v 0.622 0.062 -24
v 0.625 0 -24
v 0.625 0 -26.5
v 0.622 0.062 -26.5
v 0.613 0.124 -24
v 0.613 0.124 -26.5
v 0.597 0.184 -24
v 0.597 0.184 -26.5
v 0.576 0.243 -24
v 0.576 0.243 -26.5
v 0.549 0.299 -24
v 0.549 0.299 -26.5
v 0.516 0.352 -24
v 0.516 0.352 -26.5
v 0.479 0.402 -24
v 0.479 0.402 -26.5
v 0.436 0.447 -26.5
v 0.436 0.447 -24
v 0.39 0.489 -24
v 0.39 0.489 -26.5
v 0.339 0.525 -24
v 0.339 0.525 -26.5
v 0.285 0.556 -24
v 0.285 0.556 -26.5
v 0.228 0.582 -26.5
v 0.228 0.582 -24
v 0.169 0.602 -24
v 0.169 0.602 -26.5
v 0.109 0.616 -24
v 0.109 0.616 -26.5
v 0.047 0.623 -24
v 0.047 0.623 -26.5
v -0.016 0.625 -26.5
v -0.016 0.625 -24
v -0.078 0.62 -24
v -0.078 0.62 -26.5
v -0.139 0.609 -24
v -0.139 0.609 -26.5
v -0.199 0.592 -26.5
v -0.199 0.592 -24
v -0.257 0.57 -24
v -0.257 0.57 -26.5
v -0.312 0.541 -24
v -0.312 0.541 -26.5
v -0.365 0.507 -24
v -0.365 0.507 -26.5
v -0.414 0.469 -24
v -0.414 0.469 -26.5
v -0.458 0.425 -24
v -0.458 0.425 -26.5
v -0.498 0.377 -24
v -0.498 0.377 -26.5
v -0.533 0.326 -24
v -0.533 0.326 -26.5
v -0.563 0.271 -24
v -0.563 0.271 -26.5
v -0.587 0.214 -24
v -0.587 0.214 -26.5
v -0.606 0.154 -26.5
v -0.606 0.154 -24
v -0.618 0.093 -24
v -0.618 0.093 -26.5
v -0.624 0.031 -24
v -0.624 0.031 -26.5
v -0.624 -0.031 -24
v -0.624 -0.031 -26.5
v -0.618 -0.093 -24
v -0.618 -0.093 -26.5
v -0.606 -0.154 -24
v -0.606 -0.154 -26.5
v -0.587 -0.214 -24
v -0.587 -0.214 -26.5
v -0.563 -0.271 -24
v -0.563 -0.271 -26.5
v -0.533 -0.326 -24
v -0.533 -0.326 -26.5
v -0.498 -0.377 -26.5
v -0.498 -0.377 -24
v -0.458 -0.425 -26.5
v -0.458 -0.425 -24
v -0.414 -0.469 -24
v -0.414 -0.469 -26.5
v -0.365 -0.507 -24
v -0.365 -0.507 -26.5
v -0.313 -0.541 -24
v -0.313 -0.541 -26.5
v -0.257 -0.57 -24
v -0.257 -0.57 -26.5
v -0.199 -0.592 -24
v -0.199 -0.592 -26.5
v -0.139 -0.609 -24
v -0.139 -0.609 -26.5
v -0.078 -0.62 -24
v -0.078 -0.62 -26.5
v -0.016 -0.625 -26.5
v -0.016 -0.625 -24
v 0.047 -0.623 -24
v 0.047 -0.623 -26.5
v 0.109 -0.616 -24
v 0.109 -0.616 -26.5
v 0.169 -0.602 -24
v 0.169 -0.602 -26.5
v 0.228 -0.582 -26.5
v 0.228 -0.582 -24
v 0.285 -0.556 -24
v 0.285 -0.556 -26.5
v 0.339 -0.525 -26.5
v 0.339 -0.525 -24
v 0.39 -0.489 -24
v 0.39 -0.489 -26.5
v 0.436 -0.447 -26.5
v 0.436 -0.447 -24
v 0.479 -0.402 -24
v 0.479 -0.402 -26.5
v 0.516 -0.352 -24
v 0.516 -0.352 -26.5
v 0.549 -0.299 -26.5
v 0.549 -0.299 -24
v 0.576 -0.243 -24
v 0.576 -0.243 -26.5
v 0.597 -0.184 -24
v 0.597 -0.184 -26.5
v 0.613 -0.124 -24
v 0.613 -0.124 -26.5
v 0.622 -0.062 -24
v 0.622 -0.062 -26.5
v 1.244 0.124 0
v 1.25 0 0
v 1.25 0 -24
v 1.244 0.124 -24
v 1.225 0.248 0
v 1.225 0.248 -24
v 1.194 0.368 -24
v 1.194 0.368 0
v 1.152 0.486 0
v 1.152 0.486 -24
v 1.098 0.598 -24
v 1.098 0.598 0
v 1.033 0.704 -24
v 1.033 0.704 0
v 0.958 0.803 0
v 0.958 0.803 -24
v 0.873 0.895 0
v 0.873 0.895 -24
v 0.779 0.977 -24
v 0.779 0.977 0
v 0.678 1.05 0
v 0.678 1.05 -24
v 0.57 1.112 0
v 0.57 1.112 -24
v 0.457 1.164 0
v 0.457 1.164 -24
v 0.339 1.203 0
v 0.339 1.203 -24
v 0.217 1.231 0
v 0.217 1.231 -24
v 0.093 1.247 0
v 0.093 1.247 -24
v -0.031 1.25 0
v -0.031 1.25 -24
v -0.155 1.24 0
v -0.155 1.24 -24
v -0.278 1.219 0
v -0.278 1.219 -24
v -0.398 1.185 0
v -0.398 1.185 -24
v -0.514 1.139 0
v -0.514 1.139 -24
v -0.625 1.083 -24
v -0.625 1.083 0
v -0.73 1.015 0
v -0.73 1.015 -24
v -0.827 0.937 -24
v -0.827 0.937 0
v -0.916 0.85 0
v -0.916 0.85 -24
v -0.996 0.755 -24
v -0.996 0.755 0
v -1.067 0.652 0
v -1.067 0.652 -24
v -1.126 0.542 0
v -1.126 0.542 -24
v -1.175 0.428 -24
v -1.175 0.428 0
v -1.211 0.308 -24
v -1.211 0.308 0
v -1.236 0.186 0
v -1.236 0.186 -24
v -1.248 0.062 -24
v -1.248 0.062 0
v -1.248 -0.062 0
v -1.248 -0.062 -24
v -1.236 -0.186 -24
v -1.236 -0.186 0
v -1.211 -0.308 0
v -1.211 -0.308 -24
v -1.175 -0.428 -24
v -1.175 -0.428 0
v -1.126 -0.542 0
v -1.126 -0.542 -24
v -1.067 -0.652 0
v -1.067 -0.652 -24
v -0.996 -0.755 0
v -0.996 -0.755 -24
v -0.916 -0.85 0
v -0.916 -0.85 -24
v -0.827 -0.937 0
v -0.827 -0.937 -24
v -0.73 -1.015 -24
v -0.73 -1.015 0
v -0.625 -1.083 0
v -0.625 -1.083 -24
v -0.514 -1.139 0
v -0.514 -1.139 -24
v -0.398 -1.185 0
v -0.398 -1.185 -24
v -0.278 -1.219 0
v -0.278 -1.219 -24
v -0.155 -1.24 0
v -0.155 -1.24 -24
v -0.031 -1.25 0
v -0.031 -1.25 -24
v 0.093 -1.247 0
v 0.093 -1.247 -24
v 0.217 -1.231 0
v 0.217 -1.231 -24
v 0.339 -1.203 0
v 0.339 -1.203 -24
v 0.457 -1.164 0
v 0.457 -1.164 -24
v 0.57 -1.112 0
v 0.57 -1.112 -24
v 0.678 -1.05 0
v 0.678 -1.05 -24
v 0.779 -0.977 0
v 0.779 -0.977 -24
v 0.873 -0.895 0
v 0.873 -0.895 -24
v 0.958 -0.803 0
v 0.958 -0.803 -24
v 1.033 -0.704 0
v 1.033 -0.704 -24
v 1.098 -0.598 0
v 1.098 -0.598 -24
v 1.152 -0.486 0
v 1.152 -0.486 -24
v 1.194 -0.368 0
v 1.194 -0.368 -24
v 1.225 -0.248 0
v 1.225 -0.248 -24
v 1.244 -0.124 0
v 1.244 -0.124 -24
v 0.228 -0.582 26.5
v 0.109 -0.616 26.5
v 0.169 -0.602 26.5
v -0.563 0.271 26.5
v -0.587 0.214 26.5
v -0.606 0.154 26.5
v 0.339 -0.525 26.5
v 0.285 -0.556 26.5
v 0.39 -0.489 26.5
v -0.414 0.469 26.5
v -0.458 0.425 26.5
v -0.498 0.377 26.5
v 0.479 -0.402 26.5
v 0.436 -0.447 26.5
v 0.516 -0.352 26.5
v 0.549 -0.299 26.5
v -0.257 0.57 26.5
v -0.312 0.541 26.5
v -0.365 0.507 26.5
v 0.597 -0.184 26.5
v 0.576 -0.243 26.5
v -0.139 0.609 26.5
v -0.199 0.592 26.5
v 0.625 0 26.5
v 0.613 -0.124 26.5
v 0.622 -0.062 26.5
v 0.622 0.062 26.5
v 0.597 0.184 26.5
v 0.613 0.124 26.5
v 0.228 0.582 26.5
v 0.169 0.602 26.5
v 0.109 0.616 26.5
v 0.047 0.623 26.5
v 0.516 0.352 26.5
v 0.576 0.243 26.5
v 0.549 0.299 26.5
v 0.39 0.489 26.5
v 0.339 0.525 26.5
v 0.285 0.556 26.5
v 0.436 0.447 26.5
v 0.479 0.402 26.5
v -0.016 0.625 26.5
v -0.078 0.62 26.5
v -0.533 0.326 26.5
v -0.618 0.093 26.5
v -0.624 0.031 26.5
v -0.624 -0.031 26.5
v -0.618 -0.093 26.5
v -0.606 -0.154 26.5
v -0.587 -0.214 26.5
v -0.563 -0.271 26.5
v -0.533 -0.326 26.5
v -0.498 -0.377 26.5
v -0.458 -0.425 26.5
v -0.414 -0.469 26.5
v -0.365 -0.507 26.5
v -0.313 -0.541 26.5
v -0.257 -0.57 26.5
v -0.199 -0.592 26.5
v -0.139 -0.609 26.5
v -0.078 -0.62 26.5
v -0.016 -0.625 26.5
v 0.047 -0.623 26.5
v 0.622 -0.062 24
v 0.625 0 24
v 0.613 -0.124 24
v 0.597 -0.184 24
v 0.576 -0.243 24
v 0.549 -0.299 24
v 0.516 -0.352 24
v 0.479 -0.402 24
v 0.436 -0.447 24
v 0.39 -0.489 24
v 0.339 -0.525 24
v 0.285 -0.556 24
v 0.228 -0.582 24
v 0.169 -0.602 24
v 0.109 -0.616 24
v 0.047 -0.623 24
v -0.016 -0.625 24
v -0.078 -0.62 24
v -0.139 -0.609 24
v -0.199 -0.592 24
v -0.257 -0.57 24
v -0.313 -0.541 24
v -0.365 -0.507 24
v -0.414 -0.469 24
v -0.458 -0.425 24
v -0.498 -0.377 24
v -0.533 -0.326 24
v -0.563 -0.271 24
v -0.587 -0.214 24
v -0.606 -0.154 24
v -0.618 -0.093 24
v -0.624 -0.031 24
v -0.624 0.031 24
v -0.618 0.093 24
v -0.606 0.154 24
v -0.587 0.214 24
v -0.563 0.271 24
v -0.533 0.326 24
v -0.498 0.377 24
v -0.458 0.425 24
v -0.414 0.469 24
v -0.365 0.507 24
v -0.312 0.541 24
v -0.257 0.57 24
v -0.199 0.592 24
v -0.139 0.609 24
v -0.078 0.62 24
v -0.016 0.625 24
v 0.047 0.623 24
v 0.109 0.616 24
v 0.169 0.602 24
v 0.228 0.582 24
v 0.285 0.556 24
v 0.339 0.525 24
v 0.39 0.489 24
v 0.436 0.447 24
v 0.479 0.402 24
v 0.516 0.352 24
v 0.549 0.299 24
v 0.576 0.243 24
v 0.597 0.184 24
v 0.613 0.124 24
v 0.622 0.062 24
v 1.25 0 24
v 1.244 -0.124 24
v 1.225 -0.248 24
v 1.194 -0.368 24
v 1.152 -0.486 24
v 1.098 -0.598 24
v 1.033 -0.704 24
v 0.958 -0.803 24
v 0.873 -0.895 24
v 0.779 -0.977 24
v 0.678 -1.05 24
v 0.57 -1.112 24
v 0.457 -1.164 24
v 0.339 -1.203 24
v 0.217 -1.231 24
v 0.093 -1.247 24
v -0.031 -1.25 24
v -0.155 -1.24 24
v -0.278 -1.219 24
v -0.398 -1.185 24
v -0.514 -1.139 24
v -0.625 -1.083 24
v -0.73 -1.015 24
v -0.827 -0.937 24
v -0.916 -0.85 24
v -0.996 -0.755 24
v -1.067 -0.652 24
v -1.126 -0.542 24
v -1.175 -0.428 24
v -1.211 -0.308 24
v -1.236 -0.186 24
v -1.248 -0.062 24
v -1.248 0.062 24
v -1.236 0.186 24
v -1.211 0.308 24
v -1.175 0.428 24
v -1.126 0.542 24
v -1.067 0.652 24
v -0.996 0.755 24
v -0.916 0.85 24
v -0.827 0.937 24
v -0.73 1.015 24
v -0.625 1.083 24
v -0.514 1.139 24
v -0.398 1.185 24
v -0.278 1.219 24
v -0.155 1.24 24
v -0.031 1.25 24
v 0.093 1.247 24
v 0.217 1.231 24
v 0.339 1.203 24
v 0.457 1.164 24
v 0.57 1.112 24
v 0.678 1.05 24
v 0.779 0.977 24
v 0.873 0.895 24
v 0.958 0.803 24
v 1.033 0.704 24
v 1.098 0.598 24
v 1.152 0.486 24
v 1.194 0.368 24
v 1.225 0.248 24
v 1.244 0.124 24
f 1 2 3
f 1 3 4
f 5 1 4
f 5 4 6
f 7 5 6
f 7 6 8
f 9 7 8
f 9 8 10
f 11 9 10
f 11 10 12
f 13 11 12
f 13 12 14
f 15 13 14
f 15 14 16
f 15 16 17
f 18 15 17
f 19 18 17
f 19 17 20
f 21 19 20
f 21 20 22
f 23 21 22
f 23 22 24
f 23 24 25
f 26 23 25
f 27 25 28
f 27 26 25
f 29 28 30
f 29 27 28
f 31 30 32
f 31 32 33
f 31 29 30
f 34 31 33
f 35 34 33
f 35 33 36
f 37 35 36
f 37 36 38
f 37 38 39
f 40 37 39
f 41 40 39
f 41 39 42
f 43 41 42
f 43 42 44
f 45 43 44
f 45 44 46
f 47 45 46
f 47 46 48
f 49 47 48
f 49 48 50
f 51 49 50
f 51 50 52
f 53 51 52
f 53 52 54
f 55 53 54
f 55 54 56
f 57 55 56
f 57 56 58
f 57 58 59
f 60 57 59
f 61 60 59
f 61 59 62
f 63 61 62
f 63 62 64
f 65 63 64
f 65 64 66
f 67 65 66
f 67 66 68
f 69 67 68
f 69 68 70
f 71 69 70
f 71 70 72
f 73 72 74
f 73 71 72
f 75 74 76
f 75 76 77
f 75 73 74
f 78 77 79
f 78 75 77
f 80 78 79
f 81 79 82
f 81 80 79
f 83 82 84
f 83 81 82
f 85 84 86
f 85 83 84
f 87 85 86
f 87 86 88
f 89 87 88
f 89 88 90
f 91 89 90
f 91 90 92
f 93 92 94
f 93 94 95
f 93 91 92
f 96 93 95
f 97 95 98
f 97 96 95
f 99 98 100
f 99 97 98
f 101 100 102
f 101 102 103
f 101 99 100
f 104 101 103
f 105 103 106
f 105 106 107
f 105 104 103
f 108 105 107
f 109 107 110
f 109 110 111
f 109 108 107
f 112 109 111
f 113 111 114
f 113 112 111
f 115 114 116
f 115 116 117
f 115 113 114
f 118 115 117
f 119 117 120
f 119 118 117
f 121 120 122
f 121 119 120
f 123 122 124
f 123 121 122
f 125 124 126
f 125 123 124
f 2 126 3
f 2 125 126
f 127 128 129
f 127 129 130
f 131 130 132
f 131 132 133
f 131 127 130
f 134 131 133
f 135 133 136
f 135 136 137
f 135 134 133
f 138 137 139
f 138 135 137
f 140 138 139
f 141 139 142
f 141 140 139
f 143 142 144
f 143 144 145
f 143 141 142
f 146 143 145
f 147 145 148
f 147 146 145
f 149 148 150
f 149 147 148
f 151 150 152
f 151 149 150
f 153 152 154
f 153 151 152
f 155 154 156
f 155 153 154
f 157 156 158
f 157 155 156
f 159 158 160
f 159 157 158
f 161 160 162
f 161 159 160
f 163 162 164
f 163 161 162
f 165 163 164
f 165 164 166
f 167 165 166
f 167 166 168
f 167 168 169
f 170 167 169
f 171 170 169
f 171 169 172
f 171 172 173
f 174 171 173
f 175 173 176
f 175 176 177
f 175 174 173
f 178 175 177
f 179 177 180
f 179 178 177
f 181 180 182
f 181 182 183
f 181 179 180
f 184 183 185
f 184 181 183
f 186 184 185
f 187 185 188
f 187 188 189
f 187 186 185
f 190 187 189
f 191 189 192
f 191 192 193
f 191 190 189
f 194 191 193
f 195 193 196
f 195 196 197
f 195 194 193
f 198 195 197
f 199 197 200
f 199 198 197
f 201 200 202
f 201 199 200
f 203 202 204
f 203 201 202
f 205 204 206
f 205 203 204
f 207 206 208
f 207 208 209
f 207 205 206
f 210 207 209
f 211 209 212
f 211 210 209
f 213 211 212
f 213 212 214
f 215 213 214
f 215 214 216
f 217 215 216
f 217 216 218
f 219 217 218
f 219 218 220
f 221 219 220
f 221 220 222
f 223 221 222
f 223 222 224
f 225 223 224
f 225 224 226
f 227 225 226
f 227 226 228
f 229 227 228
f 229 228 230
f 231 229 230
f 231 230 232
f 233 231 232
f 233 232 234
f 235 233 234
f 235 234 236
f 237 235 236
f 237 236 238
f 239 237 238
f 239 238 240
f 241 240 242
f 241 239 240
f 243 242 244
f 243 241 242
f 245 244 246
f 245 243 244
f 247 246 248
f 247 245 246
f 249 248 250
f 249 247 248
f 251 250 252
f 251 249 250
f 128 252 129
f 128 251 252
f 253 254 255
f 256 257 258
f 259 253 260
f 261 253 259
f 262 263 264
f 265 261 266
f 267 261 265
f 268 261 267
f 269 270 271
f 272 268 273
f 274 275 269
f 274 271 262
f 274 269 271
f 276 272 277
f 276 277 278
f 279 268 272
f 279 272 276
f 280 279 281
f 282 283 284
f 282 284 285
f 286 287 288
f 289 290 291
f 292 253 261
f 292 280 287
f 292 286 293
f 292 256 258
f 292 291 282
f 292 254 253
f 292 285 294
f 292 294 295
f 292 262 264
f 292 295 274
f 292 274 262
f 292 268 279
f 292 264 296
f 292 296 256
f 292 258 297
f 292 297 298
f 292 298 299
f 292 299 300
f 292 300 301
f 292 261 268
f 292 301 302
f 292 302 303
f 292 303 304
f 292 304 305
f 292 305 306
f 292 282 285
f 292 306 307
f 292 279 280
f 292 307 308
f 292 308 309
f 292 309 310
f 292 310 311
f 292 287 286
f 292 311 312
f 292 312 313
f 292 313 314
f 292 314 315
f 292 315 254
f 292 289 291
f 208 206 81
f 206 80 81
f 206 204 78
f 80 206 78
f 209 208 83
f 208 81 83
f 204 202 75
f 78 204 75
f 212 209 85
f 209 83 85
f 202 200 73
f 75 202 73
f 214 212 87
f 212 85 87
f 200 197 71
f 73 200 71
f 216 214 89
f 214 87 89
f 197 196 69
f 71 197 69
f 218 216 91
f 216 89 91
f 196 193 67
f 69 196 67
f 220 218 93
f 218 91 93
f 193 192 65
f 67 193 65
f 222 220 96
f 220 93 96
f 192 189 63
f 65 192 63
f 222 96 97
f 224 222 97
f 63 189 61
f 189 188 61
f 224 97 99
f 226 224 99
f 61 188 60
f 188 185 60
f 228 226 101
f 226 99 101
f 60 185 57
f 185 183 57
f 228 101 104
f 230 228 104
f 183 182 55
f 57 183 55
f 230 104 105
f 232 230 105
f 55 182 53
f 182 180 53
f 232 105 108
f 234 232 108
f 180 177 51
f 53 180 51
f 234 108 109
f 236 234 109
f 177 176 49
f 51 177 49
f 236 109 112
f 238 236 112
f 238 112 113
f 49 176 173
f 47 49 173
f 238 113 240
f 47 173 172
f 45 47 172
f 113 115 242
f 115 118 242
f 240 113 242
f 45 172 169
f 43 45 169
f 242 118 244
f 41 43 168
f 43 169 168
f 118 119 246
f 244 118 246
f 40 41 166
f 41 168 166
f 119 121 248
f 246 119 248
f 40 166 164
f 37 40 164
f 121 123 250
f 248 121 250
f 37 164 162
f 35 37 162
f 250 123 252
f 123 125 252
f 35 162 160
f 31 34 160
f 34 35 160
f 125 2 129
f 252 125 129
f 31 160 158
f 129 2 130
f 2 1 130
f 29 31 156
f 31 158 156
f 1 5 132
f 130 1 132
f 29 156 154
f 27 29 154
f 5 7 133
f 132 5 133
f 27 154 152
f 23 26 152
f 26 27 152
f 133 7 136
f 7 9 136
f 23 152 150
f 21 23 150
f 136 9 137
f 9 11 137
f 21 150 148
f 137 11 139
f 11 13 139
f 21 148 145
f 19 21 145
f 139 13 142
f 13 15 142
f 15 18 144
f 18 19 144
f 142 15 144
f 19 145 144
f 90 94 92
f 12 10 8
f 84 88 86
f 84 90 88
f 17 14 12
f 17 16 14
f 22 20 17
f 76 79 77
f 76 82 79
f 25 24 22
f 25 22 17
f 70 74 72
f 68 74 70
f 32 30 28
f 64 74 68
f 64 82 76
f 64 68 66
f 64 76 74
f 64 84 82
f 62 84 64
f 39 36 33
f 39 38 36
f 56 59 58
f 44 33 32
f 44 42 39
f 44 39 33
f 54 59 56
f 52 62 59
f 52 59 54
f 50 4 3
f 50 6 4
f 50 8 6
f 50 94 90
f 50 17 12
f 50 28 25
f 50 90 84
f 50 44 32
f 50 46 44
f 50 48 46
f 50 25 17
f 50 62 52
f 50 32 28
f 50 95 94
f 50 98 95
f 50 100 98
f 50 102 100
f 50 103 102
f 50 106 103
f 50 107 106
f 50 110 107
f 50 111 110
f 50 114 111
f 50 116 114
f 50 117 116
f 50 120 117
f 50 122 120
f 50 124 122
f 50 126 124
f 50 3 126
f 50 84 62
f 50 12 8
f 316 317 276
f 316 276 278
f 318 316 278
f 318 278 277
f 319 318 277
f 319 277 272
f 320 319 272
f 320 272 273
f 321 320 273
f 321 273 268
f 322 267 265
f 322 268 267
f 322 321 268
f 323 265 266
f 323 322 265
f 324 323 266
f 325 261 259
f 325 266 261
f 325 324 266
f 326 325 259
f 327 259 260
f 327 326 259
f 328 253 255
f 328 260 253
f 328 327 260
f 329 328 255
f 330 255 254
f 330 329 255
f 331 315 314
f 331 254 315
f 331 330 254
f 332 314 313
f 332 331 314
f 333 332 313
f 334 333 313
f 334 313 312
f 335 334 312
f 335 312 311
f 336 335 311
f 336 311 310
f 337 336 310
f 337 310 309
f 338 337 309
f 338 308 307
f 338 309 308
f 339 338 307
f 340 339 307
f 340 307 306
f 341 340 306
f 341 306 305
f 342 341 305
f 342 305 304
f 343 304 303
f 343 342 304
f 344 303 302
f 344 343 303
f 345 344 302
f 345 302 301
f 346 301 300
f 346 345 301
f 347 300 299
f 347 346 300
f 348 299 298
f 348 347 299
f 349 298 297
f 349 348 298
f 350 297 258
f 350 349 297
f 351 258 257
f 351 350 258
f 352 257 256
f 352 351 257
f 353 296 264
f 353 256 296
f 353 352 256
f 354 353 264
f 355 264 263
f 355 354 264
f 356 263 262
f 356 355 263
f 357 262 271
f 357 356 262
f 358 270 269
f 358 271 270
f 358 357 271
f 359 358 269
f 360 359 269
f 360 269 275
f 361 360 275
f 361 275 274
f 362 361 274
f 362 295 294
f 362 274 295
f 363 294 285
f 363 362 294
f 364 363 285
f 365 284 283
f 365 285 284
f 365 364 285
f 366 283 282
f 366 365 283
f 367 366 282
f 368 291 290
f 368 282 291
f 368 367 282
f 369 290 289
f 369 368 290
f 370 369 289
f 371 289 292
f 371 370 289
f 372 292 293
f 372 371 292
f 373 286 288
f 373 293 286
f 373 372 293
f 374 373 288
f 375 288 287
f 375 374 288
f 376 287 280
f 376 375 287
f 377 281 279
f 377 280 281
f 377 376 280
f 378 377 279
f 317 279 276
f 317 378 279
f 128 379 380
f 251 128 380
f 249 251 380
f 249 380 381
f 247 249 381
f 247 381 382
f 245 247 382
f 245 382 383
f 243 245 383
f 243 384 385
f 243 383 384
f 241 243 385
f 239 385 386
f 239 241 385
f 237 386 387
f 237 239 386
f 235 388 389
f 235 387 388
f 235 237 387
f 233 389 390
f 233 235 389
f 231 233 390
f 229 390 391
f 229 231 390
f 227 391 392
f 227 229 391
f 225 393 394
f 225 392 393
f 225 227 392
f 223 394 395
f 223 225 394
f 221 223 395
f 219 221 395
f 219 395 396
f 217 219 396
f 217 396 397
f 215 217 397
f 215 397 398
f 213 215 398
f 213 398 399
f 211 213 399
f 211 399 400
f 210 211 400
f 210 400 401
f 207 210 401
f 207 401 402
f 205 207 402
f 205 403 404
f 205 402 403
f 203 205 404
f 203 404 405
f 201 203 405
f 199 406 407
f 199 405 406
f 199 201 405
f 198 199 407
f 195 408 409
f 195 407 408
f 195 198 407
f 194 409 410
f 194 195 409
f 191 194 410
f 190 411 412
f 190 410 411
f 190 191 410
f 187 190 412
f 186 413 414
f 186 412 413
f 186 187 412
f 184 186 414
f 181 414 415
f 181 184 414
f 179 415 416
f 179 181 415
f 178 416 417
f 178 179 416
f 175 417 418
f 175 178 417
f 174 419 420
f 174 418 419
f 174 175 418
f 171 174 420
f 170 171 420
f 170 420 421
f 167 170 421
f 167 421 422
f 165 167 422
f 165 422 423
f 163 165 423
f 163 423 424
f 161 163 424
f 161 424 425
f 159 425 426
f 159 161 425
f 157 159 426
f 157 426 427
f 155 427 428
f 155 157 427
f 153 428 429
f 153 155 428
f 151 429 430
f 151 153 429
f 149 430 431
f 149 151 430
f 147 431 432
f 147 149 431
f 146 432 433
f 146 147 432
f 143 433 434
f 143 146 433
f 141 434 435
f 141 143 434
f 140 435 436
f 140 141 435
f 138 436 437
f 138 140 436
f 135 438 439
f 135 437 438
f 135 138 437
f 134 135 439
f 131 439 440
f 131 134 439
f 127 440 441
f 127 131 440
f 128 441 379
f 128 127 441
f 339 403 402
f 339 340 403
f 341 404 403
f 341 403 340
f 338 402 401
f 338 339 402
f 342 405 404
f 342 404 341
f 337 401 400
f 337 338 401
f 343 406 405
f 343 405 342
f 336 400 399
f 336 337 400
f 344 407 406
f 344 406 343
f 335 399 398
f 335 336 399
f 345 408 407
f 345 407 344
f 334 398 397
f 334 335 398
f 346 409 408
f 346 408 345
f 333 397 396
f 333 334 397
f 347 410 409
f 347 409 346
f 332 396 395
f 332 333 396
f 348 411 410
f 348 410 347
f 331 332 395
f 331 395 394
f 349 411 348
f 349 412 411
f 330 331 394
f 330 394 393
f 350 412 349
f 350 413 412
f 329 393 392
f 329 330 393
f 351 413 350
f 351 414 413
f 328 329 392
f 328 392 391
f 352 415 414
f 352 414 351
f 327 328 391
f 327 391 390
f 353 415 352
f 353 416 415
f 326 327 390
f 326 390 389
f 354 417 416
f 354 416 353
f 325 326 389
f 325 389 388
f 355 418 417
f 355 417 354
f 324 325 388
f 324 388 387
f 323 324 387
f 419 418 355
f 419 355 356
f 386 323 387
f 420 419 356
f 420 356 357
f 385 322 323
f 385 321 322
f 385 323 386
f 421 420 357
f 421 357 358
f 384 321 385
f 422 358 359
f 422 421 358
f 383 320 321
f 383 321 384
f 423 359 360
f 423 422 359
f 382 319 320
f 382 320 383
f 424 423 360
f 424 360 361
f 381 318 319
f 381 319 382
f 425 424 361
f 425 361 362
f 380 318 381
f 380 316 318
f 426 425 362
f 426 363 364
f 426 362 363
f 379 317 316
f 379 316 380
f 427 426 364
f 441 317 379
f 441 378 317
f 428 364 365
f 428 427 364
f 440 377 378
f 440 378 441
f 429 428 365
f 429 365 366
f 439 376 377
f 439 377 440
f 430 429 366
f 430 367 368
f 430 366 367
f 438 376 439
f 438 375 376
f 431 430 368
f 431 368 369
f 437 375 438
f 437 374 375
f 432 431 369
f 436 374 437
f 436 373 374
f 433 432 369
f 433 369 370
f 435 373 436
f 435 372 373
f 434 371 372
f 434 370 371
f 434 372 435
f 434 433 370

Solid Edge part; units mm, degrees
sketch "Sketch1" plane through (0, 0, 0) normal (0, 0, 1) x (1, 0, 0)
  circle A0 centre (0, 0) radius 1.25
extrude "Protrusion1" add sketch "Sketch1" along normal mid plane 48
sketch "Sketch2" plane through (0, 0, 24) normal (0, 0, 1) x (1, 0, 0)
  circle A0 centre (0, 0) radius 0.625
extrude "Protrusion2" add sketch "Sketch2" along normal up to surface (2.5 mm away)
mirror "Mirror1" about plane through (0, 0, 0) normal (0, 0, 1) of "Protrusion2"
